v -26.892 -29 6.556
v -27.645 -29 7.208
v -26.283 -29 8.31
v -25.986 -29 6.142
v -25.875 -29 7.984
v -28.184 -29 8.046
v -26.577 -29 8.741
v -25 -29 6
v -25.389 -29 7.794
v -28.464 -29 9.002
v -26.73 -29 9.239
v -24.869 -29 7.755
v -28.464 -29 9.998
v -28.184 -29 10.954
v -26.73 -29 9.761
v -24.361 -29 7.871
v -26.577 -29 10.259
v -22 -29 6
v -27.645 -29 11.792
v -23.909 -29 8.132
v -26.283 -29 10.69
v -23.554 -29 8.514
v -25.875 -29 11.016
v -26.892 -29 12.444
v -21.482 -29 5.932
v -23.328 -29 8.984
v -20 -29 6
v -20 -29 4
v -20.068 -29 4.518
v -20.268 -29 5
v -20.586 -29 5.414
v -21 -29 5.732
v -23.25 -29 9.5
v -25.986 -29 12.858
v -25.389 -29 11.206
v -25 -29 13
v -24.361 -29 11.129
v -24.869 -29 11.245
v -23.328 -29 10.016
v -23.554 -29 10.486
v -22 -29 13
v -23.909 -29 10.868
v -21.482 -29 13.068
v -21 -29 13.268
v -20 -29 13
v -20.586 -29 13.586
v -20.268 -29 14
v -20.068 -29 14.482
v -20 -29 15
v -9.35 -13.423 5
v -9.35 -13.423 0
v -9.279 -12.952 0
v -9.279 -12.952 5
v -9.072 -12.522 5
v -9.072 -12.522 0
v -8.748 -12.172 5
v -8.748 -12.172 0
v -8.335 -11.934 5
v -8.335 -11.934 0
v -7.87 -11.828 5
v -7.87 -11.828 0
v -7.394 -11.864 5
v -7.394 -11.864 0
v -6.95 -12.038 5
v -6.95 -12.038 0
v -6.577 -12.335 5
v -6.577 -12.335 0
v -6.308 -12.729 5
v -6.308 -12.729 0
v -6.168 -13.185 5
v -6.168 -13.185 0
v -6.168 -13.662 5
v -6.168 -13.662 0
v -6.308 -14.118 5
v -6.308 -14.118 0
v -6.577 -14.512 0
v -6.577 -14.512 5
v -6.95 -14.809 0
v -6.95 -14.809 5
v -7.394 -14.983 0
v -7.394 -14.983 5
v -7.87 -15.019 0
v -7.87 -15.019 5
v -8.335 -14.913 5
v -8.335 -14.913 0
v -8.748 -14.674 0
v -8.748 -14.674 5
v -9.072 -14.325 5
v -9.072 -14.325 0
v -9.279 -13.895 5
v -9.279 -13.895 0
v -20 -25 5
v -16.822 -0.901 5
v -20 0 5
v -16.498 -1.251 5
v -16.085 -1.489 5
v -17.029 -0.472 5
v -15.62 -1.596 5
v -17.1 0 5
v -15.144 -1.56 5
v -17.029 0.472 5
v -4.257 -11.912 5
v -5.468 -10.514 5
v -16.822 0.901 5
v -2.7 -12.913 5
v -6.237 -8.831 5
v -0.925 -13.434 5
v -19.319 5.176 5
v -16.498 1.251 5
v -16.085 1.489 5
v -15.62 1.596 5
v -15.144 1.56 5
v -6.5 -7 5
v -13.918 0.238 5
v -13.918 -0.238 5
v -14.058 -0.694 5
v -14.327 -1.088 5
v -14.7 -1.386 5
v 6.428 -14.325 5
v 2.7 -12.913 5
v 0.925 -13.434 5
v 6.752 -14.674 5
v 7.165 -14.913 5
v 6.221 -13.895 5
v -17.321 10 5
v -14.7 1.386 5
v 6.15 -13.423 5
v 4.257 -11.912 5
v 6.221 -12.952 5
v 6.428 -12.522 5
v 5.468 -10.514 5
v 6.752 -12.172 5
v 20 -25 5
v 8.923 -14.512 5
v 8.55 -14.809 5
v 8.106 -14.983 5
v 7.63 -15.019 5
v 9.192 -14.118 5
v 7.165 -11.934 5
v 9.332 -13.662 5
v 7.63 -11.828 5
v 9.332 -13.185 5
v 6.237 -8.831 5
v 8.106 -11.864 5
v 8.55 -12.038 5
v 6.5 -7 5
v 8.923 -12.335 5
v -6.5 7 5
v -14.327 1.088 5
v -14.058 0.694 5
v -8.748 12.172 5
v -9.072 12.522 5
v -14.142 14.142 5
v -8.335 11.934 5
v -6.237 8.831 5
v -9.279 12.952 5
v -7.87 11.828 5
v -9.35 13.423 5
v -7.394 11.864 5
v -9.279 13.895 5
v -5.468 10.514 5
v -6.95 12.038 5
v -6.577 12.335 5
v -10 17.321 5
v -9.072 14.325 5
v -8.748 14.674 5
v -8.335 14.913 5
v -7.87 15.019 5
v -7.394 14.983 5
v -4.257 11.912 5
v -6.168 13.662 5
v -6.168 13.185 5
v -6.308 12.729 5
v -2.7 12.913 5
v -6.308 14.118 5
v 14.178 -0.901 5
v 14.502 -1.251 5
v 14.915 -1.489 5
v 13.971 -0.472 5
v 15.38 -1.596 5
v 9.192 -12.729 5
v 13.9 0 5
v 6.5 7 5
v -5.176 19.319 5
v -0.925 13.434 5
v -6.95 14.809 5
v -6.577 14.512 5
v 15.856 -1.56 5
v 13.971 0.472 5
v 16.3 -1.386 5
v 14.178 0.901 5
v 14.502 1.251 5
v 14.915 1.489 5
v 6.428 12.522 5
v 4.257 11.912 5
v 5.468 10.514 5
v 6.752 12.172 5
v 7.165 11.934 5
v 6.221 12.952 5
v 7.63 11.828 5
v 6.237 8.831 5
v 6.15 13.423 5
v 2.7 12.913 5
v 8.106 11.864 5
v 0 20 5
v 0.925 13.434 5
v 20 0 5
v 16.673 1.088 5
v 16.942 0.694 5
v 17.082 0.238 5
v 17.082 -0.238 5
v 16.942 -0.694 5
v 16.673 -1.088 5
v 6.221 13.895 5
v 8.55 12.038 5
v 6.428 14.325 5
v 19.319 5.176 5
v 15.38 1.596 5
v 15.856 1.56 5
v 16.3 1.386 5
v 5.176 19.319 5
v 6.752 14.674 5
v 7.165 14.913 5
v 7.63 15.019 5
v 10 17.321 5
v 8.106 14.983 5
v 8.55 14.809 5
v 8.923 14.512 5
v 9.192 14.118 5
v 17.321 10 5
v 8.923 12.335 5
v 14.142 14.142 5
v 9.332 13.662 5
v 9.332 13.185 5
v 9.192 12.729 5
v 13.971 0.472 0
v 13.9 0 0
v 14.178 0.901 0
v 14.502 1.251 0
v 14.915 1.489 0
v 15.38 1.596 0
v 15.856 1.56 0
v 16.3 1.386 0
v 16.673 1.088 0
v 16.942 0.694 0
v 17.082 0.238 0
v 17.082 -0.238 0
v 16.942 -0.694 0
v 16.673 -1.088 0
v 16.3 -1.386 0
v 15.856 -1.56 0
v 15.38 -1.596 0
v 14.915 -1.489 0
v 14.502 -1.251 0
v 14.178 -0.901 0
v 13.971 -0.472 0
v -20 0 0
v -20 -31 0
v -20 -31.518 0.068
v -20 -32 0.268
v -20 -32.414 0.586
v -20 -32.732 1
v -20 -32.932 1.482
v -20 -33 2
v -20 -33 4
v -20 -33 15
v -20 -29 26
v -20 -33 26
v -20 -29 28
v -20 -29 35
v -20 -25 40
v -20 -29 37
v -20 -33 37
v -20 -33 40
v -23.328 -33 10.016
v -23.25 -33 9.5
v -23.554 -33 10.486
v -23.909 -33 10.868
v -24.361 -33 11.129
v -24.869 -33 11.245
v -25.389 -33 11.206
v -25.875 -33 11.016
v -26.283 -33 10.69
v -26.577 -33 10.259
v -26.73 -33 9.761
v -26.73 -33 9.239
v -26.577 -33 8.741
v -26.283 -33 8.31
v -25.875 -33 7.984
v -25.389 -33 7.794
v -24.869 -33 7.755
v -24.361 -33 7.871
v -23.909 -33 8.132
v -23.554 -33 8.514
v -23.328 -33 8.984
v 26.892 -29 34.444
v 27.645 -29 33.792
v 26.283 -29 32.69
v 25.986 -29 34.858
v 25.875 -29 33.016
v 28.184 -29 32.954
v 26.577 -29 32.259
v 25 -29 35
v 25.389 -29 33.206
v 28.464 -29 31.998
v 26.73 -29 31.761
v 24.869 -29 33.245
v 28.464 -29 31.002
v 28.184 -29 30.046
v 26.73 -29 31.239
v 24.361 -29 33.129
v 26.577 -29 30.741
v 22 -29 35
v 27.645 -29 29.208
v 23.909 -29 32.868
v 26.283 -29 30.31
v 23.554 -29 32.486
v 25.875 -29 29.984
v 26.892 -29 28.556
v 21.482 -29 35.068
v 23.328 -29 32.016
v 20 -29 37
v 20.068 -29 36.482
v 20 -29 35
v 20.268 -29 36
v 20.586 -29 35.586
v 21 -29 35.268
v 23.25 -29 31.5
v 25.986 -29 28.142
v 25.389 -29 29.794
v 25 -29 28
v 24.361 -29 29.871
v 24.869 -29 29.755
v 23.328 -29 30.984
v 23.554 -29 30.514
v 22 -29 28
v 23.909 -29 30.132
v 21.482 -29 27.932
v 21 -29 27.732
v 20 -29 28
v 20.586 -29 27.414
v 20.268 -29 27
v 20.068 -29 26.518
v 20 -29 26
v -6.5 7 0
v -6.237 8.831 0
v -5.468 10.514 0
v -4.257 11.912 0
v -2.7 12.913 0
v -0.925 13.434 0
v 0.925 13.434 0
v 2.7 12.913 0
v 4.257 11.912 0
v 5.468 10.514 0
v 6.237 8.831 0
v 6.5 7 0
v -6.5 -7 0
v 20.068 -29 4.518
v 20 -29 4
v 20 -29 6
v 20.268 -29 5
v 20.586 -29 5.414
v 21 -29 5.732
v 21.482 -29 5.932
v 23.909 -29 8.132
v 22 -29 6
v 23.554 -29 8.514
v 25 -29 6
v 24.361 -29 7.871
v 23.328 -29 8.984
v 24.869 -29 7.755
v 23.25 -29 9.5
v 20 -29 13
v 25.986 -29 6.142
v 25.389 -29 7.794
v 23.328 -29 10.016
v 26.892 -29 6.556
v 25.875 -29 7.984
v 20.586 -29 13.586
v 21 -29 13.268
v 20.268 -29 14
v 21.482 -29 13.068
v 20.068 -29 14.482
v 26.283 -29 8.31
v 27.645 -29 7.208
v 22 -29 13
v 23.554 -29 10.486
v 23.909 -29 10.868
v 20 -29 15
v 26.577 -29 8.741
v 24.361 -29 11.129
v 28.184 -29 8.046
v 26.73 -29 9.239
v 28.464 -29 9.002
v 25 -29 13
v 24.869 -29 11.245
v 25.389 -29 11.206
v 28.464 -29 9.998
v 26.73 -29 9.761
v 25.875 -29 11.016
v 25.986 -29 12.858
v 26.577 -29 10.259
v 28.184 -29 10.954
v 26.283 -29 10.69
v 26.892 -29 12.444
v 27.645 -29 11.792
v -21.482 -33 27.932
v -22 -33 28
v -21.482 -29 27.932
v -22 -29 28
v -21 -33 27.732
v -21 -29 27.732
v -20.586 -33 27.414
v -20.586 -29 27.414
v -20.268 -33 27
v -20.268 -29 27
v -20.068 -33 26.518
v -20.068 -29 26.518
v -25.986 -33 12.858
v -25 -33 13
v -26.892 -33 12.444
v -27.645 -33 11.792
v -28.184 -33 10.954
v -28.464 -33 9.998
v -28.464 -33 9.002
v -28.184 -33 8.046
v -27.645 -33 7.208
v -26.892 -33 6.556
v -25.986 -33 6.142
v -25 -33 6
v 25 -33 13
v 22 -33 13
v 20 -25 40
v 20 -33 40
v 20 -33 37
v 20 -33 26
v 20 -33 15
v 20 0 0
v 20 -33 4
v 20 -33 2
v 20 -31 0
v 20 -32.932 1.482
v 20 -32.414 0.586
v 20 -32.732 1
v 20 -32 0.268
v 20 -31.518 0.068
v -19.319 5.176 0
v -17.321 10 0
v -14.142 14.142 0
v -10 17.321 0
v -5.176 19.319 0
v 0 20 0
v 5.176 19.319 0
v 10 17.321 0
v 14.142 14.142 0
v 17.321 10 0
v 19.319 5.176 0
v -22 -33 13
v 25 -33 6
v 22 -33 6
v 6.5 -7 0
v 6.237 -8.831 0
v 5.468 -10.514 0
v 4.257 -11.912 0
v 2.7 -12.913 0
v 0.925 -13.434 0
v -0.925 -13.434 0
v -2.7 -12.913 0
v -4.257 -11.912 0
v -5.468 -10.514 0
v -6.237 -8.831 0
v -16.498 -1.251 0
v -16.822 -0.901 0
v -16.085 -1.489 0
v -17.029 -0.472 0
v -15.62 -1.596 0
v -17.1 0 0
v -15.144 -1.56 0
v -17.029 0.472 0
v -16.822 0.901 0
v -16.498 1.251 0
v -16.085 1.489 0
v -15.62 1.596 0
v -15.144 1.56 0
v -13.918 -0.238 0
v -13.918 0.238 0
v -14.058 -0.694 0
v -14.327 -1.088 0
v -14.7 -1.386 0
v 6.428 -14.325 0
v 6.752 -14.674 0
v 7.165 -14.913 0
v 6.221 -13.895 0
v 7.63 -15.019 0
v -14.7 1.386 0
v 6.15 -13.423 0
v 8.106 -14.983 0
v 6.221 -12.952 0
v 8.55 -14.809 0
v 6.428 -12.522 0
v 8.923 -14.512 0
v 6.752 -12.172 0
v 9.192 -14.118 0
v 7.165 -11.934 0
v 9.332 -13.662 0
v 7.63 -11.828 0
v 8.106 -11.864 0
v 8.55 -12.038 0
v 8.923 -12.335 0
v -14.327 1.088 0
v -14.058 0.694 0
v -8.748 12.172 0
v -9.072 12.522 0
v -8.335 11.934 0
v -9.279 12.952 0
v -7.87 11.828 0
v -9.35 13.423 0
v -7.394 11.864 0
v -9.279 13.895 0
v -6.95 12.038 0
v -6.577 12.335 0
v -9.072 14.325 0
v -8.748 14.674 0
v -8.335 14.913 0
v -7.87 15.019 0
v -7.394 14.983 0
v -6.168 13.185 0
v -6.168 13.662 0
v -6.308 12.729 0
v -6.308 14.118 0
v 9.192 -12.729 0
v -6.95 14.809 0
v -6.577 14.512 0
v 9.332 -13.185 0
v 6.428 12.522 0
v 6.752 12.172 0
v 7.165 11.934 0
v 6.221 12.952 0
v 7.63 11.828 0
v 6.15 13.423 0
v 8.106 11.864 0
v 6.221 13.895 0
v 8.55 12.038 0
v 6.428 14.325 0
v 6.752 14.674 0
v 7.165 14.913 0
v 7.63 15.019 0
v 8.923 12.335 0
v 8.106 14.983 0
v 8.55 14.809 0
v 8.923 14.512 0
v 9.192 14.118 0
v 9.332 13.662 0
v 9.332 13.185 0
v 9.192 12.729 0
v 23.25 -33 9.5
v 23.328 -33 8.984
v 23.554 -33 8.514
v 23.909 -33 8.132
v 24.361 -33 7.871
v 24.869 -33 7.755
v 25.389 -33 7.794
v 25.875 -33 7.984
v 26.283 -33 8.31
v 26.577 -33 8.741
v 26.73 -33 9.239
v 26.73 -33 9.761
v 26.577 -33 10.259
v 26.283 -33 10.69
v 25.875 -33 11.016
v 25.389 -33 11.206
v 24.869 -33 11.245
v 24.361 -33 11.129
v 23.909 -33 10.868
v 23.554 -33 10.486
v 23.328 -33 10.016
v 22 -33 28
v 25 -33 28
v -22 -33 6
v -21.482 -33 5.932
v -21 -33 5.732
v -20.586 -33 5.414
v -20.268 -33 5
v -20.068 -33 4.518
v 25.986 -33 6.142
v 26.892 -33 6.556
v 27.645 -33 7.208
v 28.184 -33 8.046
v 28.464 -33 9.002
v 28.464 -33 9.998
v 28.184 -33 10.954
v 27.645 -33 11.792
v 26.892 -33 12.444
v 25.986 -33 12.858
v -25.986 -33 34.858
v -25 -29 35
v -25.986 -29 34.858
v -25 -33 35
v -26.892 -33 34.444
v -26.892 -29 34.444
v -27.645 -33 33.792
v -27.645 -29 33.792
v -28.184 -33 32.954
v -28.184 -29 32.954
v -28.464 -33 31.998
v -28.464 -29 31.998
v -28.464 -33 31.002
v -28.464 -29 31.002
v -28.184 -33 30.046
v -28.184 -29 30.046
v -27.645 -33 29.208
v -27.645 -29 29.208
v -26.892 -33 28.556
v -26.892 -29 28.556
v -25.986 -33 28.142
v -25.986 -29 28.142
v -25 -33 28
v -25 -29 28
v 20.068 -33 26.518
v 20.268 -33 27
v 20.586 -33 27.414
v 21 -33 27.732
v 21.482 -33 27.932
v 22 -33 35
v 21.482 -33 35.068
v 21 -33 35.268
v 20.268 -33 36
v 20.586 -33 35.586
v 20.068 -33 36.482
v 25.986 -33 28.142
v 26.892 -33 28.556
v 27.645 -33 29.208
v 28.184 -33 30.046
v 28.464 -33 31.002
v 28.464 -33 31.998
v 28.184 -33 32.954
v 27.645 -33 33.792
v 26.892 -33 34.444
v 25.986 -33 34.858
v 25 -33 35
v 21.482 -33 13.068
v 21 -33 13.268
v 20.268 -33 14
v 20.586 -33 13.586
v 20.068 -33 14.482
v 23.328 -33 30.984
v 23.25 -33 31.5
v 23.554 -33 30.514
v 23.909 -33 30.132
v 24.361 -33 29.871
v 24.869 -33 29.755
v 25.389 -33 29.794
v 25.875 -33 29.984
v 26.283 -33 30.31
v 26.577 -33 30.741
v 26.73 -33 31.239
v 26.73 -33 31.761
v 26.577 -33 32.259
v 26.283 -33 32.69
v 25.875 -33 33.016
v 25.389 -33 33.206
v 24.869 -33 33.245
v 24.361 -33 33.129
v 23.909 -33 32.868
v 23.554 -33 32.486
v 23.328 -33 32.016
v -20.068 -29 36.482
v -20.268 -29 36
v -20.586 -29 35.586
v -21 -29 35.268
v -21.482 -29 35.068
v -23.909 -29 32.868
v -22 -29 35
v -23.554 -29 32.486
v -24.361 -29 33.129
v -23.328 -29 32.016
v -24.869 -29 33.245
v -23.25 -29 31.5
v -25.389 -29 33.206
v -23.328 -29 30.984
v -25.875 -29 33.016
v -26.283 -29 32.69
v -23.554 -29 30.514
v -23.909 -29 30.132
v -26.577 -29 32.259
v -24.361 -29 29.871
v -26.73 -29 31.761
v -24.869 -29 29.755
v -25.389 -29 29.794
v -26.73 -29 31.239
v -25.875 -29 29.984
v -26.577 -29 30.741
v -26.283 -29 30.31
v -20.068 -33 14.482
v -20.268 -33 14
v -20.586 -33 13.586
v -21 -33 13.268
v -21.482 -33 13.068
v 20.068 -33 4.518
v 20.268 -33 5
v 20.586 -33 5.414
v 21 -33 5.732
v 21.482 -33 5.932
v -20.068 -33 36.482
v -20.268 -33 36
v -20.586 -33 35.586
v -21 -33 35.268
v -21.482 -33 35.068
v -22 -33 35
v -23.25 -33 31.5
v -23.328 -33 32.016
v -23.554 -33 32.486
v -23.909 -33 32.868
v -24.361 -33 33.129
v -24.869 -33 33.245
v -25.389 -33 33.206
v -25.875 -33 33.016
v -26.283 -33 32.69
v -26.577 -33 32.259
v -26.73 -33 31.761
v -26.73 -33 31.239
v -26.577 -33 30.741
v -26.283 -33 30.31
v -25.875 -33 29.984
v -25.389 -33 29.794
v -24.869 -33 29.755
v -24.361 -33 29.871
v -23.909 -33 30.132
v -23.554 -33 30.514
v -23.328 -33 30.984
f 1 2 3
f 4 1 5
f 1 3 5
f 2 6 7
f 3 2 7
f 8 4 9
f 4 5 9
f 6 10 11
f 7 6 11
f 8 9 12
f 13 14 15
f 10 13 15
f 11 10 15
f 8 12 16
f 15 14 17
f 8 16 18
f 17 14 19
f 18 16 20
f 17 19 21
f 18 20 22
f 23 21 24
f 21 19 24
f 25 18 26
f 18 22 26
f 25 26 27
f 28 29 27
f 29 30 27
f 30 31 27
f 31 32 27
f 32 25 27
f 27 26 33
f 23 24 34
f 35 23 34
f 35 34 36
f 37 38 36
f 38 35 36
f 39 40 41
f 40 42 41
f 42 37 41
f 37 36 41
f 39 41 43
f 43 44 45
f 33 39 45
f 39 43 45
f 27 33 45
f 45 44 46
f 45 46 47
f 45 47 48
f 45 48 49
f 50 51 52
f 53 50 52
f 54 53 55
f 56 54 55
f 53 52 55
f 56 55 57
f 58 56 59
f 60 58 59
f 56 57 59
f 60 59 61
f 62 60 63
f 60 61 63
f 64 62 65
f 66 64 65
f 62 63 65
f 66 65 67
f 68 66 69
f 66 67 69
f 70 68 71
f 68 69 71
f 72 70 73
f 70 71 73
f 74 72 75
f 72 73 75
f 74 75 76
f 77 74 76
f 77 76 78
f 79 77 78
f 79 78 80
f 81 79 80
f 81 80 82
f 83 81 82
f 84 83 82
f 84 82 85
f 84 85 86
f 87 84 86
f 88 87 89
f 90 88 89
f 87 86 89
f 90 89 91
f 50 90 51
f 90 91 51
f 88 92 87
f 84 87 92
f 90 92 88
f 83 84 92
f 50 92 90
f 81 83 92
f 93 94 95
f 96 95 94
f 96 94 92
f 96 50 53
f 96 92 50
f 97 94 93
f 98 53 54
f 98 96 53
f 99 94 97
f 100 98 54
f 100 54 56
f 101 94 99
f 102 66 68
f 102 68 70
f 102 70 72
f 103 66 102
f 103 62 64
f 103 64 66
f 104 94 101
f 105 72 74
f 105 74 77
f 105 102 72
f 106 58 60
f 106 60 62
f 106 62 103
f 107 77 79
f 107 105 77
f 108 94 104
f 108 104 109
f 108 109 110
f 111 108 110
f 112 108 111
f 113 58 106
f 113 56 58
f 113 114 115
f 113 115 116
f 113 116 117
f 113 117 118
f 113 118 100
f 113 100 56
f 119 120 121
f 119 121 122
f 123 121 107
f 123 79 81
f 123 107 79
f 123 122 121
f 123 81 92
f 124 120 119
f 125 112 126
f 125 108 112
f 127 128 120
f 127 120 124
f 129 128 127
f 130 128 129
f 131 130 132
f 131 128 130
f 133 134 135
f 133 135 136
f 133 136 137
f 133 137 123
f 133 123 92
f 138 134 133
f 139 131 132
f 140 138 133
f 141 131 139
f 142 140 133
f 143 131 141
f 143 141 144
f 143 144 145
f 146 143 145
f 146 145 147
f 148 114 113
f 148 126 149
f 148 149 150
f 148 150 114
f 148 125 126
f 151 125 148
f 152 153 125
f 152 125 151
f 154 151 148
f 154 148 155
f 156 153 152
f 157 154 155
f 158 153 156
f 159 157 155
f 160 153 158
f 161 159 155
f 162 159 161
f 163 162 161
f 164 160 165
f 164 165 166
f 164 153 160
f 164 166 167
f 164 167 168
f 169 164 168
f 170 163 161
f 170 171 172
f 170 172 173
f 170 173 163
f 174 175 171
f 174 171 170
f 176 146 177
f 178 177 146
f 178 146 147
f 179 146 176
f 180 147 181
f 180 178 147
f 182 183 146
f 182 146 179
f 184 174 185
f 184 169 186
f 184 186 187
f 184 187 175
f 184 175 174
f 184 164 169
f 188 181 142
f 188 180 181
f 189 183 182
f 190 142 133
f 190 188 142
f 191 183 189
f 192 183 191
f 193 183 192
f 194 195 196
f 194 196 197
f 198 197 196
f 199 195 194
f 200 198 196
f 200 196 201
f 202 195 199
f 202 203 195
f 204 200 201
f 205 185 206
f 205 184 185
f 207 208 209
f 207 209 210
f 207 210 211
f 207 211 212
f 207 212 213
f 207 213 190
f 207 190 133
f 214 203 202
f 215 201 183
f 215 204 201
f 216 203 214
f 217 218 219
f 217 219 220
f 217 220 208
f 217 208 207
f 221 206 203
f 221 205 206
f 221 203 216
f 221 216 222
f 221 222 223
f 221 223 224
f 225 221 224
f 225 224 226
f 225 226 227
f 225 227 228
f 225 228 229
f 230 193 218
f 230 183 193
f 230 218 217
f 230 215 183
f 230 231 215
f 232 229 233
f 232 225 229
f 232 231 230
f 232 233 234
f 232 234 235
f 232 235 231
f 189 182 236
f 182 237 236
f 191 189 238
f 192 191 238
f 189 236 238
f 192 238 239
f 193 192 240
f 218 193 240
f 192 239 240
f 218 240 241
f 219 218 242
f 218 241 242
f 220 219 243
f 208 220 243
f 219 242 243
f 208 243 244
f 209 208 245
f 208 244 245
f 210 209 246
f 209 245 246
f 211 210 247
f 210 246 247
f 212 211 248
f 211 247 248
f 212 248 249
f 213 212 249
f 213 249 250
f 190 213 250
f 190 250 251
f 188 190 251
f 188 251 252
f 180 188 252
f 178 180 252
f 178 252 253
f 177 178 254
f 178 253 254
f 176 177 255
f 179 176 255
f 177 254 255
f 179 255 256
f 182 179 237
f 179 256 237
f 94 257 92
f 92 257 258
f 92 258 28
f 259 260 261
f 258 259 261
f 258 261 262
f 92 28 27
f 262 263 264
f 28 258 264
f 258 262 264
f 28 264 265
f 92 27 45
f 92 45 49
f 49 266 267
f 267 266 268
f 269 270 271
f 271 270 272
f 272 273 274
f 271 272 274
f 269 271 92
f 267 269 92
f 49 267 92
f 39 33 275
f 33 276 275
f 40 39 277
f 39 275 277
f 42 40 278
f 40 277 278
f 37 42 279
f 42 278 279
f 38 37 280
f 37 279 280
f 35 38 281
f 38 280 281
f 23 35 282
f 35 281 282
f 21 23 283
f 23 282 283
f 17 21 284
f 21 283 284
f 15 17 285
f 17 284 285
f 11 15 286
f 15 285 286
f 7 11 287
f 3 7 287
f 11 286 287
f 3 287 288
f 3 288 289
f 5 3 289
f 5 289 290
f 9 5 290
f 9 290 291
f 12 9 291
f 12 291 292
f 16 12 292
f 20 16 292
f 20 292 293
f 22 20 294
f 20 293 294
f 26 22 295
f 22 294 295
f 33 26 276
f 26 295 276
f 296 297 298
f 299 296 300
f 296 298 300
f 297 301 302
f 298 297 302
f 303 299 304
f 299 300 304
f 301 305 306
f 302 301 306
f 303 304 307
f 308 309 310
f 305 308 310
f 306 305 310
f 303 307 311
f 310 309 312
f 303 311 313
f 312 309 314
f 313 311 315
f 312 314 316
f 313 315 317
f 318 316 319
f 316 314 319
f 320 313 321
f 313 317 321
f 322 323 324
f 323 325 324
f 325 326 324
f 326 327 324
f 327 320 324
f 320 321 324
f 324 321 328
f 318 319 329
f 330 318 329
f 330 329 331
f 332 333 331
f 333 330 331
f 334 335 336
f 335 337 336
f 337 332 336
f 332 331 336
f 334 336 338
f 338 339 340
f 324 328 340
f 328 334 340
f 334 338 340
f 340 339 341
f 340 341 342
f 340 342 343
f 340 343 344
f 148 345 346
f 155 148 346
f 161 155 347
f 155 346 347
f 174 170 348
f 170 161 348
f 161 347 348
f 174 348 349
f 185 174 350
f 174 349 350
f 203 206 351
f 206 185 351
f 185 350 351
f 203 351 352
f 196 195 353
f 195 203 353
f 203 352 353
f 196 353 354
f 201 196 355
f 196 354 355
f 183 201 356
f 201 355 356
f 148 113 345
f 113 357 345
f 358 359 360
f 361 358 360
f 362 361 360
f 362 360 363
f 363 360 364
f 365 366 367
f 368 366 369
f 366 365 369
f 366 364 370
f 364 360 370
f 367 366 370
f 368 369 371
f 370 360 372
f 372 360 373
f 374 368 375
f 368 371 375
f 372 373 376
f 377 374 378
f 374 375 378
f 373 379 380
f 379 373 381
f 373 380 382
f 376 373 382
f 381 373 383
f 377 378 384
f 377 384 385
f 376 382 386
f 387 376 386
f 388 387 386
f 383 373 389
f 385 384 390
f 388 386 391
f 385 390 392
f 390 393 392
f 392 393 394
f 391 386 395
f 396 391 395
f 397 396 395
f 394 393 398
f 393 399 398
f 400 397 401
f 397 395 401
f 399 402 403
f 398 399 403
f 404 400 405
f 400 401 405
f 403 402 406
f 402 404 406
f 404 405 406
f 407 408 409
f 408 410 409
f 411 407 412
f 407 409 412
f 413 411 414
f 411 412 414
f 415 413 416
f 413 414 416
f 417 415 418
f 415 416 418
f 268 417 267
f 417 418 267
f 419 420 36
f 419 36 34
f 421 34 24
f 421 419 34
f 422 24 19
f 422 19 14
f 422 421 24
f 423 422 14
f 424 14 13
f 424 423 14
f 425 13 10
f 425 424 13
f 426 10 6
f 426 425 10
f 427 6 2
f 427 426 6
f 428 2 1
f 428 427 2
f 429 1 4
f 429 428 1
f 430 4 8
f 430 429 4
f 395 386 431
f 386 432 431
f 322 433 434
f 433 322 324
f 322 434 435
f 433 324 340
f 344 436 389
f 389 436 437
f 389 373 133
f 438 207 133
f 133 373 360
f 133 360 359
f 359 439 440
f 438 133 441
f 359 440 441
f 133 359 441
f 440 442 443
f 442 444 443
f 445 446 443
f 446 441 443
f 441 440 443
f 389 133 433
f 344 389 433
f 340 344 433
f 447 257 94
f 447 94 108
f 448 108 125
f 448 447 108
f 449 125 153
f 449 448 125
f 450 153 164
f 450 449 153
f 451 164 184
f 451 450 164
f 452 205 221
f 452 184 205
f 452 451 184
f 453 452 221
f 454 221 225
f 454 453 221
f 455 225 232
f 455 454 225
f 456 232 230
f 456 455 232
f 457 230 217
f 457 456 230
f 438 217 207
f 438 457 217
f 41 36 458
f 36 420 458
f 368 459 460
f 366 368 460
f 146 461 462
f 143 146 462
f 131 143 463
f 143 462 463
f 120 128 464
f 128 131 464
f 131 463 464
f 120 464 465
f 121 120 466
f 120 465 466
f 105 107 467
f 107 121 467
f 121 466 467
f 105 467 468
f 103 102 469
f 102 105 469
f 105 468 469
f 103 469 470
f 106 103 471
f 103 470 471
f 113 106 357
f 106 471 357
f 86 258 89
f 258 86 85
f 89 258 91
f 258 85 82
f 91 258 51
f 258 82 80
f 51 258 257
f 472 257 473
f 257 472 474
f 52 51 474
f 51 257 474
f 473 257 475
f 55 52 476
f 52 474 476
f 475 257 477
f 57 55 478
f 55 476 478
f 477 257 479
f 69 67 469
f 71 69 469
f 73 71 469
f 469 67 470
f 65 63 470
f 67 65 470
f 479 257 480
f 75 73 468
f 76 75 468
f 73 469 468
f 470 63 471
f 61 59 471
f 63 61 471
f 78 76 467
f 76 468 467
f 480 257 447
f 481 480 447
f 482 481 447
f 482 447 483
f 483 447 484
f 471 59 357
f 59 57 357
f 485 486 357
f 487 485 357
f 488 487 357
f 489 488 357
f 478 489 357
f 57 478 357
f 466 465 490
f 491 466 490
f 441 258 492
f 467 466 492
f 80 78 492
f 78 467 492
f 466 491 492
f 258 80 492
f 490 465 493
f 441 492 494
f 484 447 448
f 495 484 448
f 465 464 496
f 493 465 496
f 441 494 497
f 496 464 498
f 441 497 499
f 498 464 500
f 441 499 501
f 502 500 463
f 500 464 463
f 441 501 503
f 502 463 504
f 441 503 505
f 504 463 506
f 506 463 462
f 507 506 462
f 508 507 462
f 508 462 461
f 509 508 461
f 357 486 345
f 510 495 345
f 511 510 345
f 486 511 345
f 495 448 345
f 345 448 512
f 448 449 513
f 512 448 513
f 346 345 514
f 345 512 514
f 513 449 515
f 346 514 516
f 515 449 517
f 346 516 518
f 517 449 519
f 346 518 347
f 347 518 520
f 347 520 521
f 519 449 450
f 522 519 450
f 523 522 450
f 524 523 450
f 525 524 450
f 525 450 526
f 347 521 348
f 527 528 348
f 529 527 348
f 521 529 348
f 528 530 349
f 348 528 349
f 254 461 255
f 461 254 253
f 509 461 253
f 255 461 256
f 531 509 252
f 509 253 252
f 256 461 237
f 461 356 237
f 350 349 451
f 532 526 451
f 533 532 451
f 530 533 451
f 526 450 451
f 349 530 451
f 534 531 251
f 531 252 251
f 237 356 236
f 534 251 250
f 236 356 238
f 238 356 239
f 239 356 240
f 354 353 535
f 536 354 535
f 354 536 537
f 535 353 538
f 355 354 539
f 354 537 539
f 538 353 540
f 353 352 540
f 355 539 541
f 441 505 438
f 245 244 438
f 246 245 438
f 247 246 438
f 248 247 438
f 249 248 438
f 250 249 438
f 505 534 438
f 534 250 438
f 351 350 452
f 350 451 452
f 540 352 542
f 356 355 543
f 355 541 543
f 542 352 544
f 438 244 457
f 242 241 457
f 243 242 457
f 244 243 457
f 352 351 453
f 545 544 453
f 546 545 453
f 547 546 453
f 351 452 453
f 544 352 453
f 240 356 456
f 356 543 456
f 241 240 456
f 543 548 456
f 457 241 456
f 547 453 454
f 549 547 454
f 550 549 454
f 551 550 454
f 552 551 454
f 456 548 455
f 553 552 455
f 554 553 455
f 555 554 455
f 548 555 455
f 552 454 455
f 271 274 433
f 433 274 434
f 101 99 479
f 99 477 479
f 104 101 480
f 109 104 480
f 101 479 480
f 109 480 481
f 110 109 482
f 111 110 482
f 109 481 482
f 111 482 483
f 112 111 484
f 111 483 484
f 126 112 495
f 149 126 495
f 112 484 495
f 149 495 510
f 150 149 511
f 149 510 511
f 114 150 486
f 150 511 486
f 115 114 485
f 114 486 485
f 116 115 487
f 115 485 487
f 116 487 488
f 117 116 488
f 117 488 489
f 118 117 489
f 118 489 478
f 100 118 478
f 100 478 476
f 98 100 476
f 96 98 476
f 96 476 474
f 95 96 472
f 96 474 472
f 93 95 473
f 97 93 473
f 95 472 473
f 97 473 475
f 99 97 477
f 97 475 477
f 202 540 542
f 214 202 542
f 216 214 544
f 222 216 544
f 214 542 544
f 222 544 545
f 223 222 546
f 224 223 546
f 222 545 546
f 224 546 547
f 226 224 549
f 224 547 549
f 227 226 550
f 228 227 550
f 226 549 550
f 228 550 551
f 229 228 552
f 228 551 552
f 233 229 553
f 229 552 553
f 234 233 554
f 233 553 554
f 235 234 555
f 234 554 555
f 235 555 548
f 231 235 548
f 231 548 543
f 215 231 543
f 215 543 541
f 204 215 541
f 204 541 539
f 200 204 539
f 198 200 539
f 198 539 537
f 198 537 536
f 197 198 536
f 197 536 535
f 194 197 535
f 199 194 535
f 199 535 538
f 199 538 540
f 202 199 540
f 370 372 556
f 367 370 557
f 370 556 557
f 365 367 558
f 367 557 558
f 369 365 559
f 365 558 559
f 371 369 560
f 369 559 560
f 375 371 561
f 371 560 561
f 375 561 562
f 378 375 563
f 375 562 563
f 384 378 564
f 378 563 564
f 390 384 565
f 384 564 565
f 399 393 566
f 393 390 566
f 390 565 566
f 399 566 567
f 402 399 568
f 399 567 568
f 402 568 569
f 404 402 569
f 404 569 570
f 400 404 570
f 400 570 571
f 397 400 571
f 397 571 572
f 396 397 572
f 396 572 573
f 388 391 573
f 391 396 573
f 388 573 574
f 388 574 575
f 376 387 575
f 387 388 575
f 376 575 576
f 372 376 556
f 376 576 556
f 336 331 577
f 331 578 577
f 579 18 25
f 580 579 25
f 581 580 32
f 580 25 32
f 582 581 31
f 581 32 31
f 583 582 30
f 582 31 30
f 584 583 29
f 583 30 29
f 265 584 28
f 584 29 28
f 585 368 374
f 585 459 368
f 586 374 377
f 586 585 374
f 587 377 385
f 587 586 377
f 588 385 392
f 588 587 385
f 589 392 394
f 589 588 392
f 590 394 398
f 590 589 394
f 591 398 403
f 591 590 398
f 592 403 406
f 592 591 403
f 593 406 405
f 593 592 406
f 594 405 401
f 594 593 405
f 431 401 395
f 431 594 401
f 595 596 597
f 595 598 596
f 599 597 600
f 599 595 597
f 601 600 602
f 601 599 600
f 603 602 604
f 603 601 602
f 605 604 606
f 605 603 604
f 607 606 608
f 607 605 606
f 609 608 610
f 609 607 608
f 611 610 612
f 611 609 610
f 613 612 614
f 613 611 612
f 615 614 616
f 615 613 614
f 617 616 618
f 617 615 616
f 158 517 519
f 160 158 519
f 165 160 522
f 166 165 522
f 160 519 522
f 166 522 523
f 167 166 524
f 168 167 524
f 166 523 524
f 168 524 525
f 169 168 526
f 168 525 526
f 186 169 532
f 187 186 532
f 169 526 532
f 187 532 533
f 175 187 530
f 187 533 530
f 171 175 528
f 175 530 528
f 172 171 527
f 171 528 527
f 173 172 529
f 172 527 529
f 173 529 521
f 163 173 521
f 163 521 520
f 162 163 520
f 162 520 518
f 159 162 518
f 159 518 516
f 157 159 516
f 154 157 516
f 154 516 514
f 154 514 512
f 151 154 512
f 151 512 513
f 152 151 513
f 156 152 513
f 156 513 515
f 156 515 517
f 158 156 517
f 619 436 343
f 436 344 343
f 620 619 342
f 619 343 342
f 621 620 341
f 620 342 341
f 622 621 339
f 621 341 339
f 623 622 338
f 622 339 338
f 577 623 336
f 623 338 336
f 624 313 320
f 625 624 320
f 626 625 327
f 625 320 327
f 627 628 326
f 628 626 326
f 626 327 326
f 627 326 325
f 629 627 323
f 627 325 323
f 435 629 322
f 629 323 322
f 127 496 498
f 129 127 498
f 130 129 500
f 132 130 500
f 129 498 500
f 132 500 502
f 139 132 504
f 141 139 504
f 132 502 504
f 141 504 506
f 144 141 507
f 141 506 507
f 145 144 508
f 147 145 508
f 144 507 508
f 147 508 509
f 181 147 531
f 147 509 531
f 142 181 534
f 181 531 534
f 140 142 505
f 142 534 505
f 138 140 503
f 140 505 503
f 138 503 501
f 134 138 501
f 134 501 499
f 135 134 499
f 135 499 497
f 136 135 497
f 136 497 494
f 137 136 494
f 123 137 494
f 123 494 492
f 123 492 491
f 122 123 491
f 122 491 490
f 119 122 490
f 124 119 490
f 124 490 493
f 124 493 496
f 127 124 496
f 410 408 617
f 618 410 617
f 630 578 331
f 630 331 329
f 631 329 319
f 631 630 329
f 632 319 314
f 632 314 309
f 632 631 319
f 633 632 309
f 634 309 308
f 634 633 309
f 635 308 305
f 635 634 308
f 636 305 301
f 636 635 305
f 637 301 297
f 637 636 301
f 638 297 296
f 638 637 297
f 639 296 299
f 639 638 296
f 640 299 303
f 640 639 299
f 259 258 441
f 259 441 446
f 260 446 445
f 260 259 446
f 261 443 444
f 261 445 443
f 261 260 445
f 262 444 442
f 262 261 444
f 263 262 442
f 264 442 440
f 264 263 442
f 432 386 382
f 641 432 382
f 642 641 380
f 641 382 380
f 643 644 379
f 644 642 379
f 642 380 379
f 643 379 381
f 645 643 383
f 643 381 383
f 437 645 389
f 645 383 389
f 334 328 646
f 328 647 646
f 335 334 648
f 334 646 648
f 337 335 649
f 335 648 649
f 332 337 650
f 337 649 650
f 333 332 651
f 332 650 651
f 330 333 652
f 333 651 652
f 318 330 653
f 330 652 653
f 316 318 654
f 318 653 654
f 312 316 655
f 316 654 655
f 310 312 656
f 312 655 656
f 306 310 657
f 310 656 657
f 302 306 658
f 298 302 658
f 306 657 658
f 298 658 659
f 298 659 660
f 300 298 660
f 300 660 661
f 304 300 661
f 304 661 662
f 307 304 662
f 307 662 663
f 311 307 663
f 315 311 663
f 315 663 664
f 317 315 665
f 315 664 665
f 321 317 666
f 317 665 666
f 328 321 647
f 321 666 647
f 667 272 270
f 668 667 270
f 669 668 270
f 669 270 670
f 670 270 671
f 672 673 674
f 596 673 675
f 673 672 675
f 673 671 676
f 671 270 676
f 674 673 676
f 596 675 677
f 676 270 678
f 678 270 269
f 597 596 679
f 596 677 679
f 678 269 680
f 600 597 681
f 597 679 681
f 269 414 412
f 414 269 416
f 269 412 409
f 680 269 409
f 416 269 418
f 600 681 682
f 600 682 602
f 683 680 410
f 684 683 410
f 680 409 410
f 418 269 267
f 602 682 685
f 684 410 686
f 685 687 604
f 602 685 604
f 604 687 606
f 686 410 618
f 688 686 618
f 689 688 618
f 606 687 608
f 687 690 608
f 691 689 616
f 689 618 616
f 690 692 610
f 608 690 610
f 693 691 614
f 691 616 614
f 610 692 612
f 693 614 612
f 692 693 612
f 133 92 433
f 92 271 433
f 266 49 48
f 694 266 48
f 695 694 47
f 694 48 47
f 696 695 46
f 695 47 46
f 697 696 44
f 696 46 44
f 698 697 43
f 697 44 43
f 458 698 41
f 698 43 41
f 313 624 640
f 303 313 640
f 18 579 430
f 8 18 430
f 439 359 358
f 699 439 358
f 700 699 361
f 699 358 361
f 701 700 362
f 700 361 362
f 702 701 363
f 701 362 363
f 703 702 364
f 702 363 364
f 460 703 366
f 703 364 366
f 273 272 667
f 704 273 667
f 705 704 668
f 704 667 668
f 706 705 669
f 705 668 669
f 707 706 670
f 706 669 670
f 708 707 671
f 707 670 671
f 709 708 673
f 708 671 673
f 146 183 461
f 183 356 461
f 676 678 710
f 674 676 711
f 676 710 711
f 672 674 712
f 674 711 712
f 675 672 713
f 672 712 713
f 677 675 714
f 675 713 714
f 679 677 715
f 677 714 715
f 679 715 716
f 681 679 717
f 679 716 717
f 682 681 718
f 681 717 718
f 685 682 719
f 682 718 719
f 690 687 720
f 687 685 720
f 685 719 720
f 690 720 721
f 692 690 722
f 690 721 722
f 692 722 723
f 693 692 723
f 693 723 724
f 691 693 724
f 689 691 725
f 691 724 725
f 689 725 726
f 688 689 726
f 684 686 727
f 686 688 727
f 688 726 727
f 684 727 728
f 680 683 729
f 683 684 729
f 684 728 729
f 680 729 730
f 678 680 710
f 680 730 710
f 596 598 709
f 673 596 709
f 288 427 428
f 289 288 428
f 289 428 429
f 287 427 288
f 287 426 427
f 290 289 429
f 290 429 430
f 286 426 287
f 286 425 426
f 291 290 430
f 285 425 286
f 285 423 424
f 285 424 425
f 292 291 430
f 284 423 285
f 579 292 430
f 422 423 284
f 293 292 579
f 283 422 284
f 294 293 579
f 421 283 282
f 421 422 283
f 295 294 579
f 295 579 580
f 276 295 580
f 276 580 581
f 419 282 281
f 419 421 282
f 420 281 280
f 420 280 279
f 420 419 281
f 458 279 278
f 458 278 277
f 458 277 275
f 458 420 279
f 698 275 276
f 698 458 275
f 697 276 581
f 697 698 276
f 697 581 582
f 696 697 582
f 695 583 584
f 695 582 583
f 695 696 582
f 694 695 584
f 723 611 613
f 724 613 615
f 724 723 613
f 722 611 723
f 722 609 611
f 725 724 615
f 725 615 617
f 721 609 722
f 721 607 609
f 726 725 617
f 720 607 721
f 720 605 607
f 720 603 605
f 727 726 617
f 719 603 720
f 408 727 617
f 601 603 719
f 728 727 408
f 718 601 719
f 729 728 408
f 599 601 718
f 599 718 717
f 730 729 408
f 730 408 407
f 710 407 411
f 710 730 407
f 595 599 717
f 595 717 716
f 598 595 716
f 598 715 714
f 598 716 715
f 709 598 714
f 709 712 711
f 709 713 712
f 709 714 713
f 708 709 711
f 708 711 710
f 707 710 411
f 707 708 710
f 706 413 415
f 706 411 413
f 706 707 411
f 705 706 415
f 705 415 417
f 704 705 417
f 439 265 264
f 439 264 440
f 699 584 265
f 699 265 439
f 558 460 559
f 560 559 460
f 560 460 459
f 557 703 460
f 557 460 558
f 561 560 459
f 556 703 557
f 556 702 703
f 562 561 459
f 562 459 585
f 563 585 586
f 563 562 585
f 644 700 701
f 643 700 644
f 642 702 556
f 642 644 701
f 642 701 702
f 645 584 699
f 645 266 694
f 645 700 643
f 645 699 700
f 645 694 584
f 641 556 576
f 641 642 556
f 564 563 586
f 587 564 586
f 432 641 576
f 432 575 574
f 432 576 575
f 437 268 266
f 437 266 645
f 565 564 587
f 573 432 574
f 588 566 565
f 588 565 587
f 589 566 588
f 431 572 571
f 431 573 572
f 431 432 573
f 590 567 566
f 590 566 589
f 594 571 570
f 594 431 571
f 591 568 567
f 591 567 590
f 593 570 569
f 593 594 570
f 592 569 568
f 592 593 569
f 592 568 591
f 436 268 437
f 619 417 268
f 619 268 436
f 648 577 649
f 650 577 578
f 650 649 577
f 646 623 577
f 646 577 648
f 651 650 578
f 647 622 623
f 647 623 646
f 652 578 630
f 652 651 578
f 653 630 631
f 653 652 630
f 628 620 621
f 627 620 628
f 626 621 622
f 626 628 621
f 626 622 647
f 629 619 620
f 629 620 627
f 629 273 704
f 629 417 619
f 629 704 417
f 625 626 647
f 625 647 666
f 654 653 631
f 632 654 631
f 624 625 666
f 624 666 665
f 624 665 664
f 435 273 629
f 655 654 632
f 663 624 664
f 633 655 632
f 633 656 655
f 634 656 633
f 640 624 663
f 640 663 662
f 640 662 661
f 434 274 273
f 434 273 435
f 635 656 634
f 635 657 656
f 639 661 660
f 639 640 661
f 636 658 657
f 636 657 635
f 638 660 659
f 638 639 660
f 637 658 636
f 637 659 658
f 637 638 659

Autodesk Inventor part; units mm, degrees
ref_plane "YZ Plane" through (0, 0, 0) normal (1, 0, 0) x (0, 1, 0)
ref_plane "XZ Plane" through (0, 0, 0) normal (0, 1, 0) x (-1, 0, 0)
sketch "Sketch1" plane through (0, 0, 0) normal (0, 0, 1) x (1, 0, 0)
  circle A0 centre (0, 0) radius 20
  circle A1 centre (0, 15.55) radius 1.6
  line L0 (-20, 0) -> (20, 0) construction
  line L1 (20, 0) -> (20, -33)
  line L2 (20, -33) -> (-20, -33)
  line L3 (-20, -33) -> (-20, 0)
  circle A2 centre (-13.4667, 7.775) radius 1.6
  circle A3 centre (-13.4667, -7.775) radius 1.6
  circle A4 centre (0, -15.55) radius 1.6
  circle A5 centre (13.4667, -7.775) radius 1.6
  circle A6 centre (13.4667, 7.775) radius 1.6
  line L4 (0, -7) -> (0, 7) construction
  line L5 (-6.5, -7) -> (-6.5, 7)
  line L6 (6.5, 7) -> (6.5, -7)
  arc A7 (-6.5, -7) -> (6.5, -7) centre (0, -7) ccw
  arc A8 (6.5, 7) -> (-6.5, 7) centre (0, 7) ccw
  dimension "d0" = 40
  dimension "d1" = 15.55
  dimension "d3" = 33
  dimension "d6" = 360
  dimension "d8" = 6.5
  dimension "d9" = 14
extrude "Extrusion1" add sketch "Sketch1" along normal blind 5 contours A0 | L1 L2 L3 A0 | A1 | A2 | A3 | A4 | A5 | A6
sketch "Sketch2" plane through (0, 0, 0) normal (0, 0, -1) x (-1, 0, 0)
  line L0 (20, 0) -> (20, -33) projected
  arc A0 (20, 0) -> (-20, 0) centre (0, 0) ccw projected
  line L1 (-20, -33) -> (-20, 0) projected
  line L2 (20, -33) -> (-20, -33) projected
  line L3 (-6.5, 7) -> (-6.5, -7) projected
  arc A1 (6.5, 7) -> (-6.5, 7) centre (0, 7) ccw projected
  line L4 (6.5, -7) -> (6.5, 7) projected
  arc A2 (-6.5, -7) -> (6.5, -7) centre (0, -7) ccw projected
  circle A3 centre (0, 0) radius 15.5 construction
  circle A4 centre (-7.75, 13.4234) radius 1.6
  line L5 (0, 0) -> (-7.75, 13.4234) construction
  line L6 (0, 0) -> (0, 15.5) construction
  circle A5 centre (-15.5, 0) radius 1.6
  circle A6 centre (-7.75, -13.4234) radius 1.6
  circle A7 centre (7.75, -13.4234) radius 1.6
  circle A8 centre (15.5, 0) radius 1.6
  circle A9 centre (7.75, 13.4234) radius 1.6
  dimension "d12" = 31
  dimension "d13" = 3.2
  dimension "d14" = 30
  dimension "d17" = 360
extrude "Extrusion2" cut sketch "Sketch2" against normal blind 5 contours A4 | A5 | A6 | A7 | A8 | A9
sketch "Sketch3" plane through (-20, -33, 0) normal (0, -1, 0) x (1, 0, 0)
  line L0 (0, 0) -> (40, 0) projected
  line L1 (40, 0) -> (40, 5) projected
  line L2 (0, 5) -> (40, 5) projected
  line L3 (0, 0) -> (0, 5) projected
  line L4 (40, 0) -> (40, 5) projected
  line L5 (40, 5) -> (0, 5)
  line L6 (0, 5) -> (0, 40)
  line L7 (0, 40) -> (40, 40)
  line L8 (40, 40) -> (40, 5)
  point P0 (20, 0)
  dimension "d21" = 40
extrude "Extrusion3" add sketch "Sketch3" against normal blind 8 contours L6 L7 L8 L2
fillet "Fillet1" radius 2 1 edges at (0, -33, 0)
sketch "Sketch4" plane through (-20, -33, 2) normal (0, -1, 0) x (1, 0, 0)
  line L0 (40, 38) -> (0, 38) projected
  line L1 (0, 0) -> (0, 38) projected
  line L2 (40, 0) -> (0, 0) projected
  line L3 (40, 0) -> (40, 38) projected
  line L4 (5, 4) -> (-5, 4)
  line L5 (-5, 4) -> (-5, 11)
  line L6 (-5, 11) -> (5, 11)
  line L7 (5, 11) -> (5, 4)
  line L8 (5, 4) -> (-5, 11) construction
  line L9 (-5, 4) -> (5, 11) construction
  circle A0 centre (-5, 7.5) radius 3.5
  circle A1 centre (-5, 7.5) radius 1.75
  point P0 (20, -2)
  point P1 (0, 7.5)
  point P2 (0, 4)
  point P3 (0, 11)
  point P4 (-5, 11)
  dimension "d26" = 7
  dimension "d27" = 5
  dimension "d28" = 4
  dimension "d29" = 3.5
extrude "Extrusion4" add sketch "Sketch4" against normal blind 4 contours L1 L4 A0 L6 | A0 L5 A1 | L5 A1 A0
ref_plane "Work Plane1" through (0, 0, 22.5) normal (0, 0, 1) x (1, 0, 0)
ref_plane "Work Plane2" through (0, 0, 20.5) normal (0, 0, 1) x (1, 0, 0)
mirror "Mirror2" about plane through (0, 0, 0) normal (1, 0, 0) of "Extrusion4"
mirror "Mirror3" about plane through (0, 0, 20.5) normal (0, 0, 1) of "Extrusion4", "Mirror2"
fillet "Fillet4" radius 2 8 edges at (20, -31, 6) (20, -31, 28) (-20, -31, 6) (-20, -31, 13) (-20, -31, 28) (-20, -31, 35) (20, -31, 35) (20, -31, 13)
properties part number "08_Ga_dong_co" material "Polyethylene, High Density"
